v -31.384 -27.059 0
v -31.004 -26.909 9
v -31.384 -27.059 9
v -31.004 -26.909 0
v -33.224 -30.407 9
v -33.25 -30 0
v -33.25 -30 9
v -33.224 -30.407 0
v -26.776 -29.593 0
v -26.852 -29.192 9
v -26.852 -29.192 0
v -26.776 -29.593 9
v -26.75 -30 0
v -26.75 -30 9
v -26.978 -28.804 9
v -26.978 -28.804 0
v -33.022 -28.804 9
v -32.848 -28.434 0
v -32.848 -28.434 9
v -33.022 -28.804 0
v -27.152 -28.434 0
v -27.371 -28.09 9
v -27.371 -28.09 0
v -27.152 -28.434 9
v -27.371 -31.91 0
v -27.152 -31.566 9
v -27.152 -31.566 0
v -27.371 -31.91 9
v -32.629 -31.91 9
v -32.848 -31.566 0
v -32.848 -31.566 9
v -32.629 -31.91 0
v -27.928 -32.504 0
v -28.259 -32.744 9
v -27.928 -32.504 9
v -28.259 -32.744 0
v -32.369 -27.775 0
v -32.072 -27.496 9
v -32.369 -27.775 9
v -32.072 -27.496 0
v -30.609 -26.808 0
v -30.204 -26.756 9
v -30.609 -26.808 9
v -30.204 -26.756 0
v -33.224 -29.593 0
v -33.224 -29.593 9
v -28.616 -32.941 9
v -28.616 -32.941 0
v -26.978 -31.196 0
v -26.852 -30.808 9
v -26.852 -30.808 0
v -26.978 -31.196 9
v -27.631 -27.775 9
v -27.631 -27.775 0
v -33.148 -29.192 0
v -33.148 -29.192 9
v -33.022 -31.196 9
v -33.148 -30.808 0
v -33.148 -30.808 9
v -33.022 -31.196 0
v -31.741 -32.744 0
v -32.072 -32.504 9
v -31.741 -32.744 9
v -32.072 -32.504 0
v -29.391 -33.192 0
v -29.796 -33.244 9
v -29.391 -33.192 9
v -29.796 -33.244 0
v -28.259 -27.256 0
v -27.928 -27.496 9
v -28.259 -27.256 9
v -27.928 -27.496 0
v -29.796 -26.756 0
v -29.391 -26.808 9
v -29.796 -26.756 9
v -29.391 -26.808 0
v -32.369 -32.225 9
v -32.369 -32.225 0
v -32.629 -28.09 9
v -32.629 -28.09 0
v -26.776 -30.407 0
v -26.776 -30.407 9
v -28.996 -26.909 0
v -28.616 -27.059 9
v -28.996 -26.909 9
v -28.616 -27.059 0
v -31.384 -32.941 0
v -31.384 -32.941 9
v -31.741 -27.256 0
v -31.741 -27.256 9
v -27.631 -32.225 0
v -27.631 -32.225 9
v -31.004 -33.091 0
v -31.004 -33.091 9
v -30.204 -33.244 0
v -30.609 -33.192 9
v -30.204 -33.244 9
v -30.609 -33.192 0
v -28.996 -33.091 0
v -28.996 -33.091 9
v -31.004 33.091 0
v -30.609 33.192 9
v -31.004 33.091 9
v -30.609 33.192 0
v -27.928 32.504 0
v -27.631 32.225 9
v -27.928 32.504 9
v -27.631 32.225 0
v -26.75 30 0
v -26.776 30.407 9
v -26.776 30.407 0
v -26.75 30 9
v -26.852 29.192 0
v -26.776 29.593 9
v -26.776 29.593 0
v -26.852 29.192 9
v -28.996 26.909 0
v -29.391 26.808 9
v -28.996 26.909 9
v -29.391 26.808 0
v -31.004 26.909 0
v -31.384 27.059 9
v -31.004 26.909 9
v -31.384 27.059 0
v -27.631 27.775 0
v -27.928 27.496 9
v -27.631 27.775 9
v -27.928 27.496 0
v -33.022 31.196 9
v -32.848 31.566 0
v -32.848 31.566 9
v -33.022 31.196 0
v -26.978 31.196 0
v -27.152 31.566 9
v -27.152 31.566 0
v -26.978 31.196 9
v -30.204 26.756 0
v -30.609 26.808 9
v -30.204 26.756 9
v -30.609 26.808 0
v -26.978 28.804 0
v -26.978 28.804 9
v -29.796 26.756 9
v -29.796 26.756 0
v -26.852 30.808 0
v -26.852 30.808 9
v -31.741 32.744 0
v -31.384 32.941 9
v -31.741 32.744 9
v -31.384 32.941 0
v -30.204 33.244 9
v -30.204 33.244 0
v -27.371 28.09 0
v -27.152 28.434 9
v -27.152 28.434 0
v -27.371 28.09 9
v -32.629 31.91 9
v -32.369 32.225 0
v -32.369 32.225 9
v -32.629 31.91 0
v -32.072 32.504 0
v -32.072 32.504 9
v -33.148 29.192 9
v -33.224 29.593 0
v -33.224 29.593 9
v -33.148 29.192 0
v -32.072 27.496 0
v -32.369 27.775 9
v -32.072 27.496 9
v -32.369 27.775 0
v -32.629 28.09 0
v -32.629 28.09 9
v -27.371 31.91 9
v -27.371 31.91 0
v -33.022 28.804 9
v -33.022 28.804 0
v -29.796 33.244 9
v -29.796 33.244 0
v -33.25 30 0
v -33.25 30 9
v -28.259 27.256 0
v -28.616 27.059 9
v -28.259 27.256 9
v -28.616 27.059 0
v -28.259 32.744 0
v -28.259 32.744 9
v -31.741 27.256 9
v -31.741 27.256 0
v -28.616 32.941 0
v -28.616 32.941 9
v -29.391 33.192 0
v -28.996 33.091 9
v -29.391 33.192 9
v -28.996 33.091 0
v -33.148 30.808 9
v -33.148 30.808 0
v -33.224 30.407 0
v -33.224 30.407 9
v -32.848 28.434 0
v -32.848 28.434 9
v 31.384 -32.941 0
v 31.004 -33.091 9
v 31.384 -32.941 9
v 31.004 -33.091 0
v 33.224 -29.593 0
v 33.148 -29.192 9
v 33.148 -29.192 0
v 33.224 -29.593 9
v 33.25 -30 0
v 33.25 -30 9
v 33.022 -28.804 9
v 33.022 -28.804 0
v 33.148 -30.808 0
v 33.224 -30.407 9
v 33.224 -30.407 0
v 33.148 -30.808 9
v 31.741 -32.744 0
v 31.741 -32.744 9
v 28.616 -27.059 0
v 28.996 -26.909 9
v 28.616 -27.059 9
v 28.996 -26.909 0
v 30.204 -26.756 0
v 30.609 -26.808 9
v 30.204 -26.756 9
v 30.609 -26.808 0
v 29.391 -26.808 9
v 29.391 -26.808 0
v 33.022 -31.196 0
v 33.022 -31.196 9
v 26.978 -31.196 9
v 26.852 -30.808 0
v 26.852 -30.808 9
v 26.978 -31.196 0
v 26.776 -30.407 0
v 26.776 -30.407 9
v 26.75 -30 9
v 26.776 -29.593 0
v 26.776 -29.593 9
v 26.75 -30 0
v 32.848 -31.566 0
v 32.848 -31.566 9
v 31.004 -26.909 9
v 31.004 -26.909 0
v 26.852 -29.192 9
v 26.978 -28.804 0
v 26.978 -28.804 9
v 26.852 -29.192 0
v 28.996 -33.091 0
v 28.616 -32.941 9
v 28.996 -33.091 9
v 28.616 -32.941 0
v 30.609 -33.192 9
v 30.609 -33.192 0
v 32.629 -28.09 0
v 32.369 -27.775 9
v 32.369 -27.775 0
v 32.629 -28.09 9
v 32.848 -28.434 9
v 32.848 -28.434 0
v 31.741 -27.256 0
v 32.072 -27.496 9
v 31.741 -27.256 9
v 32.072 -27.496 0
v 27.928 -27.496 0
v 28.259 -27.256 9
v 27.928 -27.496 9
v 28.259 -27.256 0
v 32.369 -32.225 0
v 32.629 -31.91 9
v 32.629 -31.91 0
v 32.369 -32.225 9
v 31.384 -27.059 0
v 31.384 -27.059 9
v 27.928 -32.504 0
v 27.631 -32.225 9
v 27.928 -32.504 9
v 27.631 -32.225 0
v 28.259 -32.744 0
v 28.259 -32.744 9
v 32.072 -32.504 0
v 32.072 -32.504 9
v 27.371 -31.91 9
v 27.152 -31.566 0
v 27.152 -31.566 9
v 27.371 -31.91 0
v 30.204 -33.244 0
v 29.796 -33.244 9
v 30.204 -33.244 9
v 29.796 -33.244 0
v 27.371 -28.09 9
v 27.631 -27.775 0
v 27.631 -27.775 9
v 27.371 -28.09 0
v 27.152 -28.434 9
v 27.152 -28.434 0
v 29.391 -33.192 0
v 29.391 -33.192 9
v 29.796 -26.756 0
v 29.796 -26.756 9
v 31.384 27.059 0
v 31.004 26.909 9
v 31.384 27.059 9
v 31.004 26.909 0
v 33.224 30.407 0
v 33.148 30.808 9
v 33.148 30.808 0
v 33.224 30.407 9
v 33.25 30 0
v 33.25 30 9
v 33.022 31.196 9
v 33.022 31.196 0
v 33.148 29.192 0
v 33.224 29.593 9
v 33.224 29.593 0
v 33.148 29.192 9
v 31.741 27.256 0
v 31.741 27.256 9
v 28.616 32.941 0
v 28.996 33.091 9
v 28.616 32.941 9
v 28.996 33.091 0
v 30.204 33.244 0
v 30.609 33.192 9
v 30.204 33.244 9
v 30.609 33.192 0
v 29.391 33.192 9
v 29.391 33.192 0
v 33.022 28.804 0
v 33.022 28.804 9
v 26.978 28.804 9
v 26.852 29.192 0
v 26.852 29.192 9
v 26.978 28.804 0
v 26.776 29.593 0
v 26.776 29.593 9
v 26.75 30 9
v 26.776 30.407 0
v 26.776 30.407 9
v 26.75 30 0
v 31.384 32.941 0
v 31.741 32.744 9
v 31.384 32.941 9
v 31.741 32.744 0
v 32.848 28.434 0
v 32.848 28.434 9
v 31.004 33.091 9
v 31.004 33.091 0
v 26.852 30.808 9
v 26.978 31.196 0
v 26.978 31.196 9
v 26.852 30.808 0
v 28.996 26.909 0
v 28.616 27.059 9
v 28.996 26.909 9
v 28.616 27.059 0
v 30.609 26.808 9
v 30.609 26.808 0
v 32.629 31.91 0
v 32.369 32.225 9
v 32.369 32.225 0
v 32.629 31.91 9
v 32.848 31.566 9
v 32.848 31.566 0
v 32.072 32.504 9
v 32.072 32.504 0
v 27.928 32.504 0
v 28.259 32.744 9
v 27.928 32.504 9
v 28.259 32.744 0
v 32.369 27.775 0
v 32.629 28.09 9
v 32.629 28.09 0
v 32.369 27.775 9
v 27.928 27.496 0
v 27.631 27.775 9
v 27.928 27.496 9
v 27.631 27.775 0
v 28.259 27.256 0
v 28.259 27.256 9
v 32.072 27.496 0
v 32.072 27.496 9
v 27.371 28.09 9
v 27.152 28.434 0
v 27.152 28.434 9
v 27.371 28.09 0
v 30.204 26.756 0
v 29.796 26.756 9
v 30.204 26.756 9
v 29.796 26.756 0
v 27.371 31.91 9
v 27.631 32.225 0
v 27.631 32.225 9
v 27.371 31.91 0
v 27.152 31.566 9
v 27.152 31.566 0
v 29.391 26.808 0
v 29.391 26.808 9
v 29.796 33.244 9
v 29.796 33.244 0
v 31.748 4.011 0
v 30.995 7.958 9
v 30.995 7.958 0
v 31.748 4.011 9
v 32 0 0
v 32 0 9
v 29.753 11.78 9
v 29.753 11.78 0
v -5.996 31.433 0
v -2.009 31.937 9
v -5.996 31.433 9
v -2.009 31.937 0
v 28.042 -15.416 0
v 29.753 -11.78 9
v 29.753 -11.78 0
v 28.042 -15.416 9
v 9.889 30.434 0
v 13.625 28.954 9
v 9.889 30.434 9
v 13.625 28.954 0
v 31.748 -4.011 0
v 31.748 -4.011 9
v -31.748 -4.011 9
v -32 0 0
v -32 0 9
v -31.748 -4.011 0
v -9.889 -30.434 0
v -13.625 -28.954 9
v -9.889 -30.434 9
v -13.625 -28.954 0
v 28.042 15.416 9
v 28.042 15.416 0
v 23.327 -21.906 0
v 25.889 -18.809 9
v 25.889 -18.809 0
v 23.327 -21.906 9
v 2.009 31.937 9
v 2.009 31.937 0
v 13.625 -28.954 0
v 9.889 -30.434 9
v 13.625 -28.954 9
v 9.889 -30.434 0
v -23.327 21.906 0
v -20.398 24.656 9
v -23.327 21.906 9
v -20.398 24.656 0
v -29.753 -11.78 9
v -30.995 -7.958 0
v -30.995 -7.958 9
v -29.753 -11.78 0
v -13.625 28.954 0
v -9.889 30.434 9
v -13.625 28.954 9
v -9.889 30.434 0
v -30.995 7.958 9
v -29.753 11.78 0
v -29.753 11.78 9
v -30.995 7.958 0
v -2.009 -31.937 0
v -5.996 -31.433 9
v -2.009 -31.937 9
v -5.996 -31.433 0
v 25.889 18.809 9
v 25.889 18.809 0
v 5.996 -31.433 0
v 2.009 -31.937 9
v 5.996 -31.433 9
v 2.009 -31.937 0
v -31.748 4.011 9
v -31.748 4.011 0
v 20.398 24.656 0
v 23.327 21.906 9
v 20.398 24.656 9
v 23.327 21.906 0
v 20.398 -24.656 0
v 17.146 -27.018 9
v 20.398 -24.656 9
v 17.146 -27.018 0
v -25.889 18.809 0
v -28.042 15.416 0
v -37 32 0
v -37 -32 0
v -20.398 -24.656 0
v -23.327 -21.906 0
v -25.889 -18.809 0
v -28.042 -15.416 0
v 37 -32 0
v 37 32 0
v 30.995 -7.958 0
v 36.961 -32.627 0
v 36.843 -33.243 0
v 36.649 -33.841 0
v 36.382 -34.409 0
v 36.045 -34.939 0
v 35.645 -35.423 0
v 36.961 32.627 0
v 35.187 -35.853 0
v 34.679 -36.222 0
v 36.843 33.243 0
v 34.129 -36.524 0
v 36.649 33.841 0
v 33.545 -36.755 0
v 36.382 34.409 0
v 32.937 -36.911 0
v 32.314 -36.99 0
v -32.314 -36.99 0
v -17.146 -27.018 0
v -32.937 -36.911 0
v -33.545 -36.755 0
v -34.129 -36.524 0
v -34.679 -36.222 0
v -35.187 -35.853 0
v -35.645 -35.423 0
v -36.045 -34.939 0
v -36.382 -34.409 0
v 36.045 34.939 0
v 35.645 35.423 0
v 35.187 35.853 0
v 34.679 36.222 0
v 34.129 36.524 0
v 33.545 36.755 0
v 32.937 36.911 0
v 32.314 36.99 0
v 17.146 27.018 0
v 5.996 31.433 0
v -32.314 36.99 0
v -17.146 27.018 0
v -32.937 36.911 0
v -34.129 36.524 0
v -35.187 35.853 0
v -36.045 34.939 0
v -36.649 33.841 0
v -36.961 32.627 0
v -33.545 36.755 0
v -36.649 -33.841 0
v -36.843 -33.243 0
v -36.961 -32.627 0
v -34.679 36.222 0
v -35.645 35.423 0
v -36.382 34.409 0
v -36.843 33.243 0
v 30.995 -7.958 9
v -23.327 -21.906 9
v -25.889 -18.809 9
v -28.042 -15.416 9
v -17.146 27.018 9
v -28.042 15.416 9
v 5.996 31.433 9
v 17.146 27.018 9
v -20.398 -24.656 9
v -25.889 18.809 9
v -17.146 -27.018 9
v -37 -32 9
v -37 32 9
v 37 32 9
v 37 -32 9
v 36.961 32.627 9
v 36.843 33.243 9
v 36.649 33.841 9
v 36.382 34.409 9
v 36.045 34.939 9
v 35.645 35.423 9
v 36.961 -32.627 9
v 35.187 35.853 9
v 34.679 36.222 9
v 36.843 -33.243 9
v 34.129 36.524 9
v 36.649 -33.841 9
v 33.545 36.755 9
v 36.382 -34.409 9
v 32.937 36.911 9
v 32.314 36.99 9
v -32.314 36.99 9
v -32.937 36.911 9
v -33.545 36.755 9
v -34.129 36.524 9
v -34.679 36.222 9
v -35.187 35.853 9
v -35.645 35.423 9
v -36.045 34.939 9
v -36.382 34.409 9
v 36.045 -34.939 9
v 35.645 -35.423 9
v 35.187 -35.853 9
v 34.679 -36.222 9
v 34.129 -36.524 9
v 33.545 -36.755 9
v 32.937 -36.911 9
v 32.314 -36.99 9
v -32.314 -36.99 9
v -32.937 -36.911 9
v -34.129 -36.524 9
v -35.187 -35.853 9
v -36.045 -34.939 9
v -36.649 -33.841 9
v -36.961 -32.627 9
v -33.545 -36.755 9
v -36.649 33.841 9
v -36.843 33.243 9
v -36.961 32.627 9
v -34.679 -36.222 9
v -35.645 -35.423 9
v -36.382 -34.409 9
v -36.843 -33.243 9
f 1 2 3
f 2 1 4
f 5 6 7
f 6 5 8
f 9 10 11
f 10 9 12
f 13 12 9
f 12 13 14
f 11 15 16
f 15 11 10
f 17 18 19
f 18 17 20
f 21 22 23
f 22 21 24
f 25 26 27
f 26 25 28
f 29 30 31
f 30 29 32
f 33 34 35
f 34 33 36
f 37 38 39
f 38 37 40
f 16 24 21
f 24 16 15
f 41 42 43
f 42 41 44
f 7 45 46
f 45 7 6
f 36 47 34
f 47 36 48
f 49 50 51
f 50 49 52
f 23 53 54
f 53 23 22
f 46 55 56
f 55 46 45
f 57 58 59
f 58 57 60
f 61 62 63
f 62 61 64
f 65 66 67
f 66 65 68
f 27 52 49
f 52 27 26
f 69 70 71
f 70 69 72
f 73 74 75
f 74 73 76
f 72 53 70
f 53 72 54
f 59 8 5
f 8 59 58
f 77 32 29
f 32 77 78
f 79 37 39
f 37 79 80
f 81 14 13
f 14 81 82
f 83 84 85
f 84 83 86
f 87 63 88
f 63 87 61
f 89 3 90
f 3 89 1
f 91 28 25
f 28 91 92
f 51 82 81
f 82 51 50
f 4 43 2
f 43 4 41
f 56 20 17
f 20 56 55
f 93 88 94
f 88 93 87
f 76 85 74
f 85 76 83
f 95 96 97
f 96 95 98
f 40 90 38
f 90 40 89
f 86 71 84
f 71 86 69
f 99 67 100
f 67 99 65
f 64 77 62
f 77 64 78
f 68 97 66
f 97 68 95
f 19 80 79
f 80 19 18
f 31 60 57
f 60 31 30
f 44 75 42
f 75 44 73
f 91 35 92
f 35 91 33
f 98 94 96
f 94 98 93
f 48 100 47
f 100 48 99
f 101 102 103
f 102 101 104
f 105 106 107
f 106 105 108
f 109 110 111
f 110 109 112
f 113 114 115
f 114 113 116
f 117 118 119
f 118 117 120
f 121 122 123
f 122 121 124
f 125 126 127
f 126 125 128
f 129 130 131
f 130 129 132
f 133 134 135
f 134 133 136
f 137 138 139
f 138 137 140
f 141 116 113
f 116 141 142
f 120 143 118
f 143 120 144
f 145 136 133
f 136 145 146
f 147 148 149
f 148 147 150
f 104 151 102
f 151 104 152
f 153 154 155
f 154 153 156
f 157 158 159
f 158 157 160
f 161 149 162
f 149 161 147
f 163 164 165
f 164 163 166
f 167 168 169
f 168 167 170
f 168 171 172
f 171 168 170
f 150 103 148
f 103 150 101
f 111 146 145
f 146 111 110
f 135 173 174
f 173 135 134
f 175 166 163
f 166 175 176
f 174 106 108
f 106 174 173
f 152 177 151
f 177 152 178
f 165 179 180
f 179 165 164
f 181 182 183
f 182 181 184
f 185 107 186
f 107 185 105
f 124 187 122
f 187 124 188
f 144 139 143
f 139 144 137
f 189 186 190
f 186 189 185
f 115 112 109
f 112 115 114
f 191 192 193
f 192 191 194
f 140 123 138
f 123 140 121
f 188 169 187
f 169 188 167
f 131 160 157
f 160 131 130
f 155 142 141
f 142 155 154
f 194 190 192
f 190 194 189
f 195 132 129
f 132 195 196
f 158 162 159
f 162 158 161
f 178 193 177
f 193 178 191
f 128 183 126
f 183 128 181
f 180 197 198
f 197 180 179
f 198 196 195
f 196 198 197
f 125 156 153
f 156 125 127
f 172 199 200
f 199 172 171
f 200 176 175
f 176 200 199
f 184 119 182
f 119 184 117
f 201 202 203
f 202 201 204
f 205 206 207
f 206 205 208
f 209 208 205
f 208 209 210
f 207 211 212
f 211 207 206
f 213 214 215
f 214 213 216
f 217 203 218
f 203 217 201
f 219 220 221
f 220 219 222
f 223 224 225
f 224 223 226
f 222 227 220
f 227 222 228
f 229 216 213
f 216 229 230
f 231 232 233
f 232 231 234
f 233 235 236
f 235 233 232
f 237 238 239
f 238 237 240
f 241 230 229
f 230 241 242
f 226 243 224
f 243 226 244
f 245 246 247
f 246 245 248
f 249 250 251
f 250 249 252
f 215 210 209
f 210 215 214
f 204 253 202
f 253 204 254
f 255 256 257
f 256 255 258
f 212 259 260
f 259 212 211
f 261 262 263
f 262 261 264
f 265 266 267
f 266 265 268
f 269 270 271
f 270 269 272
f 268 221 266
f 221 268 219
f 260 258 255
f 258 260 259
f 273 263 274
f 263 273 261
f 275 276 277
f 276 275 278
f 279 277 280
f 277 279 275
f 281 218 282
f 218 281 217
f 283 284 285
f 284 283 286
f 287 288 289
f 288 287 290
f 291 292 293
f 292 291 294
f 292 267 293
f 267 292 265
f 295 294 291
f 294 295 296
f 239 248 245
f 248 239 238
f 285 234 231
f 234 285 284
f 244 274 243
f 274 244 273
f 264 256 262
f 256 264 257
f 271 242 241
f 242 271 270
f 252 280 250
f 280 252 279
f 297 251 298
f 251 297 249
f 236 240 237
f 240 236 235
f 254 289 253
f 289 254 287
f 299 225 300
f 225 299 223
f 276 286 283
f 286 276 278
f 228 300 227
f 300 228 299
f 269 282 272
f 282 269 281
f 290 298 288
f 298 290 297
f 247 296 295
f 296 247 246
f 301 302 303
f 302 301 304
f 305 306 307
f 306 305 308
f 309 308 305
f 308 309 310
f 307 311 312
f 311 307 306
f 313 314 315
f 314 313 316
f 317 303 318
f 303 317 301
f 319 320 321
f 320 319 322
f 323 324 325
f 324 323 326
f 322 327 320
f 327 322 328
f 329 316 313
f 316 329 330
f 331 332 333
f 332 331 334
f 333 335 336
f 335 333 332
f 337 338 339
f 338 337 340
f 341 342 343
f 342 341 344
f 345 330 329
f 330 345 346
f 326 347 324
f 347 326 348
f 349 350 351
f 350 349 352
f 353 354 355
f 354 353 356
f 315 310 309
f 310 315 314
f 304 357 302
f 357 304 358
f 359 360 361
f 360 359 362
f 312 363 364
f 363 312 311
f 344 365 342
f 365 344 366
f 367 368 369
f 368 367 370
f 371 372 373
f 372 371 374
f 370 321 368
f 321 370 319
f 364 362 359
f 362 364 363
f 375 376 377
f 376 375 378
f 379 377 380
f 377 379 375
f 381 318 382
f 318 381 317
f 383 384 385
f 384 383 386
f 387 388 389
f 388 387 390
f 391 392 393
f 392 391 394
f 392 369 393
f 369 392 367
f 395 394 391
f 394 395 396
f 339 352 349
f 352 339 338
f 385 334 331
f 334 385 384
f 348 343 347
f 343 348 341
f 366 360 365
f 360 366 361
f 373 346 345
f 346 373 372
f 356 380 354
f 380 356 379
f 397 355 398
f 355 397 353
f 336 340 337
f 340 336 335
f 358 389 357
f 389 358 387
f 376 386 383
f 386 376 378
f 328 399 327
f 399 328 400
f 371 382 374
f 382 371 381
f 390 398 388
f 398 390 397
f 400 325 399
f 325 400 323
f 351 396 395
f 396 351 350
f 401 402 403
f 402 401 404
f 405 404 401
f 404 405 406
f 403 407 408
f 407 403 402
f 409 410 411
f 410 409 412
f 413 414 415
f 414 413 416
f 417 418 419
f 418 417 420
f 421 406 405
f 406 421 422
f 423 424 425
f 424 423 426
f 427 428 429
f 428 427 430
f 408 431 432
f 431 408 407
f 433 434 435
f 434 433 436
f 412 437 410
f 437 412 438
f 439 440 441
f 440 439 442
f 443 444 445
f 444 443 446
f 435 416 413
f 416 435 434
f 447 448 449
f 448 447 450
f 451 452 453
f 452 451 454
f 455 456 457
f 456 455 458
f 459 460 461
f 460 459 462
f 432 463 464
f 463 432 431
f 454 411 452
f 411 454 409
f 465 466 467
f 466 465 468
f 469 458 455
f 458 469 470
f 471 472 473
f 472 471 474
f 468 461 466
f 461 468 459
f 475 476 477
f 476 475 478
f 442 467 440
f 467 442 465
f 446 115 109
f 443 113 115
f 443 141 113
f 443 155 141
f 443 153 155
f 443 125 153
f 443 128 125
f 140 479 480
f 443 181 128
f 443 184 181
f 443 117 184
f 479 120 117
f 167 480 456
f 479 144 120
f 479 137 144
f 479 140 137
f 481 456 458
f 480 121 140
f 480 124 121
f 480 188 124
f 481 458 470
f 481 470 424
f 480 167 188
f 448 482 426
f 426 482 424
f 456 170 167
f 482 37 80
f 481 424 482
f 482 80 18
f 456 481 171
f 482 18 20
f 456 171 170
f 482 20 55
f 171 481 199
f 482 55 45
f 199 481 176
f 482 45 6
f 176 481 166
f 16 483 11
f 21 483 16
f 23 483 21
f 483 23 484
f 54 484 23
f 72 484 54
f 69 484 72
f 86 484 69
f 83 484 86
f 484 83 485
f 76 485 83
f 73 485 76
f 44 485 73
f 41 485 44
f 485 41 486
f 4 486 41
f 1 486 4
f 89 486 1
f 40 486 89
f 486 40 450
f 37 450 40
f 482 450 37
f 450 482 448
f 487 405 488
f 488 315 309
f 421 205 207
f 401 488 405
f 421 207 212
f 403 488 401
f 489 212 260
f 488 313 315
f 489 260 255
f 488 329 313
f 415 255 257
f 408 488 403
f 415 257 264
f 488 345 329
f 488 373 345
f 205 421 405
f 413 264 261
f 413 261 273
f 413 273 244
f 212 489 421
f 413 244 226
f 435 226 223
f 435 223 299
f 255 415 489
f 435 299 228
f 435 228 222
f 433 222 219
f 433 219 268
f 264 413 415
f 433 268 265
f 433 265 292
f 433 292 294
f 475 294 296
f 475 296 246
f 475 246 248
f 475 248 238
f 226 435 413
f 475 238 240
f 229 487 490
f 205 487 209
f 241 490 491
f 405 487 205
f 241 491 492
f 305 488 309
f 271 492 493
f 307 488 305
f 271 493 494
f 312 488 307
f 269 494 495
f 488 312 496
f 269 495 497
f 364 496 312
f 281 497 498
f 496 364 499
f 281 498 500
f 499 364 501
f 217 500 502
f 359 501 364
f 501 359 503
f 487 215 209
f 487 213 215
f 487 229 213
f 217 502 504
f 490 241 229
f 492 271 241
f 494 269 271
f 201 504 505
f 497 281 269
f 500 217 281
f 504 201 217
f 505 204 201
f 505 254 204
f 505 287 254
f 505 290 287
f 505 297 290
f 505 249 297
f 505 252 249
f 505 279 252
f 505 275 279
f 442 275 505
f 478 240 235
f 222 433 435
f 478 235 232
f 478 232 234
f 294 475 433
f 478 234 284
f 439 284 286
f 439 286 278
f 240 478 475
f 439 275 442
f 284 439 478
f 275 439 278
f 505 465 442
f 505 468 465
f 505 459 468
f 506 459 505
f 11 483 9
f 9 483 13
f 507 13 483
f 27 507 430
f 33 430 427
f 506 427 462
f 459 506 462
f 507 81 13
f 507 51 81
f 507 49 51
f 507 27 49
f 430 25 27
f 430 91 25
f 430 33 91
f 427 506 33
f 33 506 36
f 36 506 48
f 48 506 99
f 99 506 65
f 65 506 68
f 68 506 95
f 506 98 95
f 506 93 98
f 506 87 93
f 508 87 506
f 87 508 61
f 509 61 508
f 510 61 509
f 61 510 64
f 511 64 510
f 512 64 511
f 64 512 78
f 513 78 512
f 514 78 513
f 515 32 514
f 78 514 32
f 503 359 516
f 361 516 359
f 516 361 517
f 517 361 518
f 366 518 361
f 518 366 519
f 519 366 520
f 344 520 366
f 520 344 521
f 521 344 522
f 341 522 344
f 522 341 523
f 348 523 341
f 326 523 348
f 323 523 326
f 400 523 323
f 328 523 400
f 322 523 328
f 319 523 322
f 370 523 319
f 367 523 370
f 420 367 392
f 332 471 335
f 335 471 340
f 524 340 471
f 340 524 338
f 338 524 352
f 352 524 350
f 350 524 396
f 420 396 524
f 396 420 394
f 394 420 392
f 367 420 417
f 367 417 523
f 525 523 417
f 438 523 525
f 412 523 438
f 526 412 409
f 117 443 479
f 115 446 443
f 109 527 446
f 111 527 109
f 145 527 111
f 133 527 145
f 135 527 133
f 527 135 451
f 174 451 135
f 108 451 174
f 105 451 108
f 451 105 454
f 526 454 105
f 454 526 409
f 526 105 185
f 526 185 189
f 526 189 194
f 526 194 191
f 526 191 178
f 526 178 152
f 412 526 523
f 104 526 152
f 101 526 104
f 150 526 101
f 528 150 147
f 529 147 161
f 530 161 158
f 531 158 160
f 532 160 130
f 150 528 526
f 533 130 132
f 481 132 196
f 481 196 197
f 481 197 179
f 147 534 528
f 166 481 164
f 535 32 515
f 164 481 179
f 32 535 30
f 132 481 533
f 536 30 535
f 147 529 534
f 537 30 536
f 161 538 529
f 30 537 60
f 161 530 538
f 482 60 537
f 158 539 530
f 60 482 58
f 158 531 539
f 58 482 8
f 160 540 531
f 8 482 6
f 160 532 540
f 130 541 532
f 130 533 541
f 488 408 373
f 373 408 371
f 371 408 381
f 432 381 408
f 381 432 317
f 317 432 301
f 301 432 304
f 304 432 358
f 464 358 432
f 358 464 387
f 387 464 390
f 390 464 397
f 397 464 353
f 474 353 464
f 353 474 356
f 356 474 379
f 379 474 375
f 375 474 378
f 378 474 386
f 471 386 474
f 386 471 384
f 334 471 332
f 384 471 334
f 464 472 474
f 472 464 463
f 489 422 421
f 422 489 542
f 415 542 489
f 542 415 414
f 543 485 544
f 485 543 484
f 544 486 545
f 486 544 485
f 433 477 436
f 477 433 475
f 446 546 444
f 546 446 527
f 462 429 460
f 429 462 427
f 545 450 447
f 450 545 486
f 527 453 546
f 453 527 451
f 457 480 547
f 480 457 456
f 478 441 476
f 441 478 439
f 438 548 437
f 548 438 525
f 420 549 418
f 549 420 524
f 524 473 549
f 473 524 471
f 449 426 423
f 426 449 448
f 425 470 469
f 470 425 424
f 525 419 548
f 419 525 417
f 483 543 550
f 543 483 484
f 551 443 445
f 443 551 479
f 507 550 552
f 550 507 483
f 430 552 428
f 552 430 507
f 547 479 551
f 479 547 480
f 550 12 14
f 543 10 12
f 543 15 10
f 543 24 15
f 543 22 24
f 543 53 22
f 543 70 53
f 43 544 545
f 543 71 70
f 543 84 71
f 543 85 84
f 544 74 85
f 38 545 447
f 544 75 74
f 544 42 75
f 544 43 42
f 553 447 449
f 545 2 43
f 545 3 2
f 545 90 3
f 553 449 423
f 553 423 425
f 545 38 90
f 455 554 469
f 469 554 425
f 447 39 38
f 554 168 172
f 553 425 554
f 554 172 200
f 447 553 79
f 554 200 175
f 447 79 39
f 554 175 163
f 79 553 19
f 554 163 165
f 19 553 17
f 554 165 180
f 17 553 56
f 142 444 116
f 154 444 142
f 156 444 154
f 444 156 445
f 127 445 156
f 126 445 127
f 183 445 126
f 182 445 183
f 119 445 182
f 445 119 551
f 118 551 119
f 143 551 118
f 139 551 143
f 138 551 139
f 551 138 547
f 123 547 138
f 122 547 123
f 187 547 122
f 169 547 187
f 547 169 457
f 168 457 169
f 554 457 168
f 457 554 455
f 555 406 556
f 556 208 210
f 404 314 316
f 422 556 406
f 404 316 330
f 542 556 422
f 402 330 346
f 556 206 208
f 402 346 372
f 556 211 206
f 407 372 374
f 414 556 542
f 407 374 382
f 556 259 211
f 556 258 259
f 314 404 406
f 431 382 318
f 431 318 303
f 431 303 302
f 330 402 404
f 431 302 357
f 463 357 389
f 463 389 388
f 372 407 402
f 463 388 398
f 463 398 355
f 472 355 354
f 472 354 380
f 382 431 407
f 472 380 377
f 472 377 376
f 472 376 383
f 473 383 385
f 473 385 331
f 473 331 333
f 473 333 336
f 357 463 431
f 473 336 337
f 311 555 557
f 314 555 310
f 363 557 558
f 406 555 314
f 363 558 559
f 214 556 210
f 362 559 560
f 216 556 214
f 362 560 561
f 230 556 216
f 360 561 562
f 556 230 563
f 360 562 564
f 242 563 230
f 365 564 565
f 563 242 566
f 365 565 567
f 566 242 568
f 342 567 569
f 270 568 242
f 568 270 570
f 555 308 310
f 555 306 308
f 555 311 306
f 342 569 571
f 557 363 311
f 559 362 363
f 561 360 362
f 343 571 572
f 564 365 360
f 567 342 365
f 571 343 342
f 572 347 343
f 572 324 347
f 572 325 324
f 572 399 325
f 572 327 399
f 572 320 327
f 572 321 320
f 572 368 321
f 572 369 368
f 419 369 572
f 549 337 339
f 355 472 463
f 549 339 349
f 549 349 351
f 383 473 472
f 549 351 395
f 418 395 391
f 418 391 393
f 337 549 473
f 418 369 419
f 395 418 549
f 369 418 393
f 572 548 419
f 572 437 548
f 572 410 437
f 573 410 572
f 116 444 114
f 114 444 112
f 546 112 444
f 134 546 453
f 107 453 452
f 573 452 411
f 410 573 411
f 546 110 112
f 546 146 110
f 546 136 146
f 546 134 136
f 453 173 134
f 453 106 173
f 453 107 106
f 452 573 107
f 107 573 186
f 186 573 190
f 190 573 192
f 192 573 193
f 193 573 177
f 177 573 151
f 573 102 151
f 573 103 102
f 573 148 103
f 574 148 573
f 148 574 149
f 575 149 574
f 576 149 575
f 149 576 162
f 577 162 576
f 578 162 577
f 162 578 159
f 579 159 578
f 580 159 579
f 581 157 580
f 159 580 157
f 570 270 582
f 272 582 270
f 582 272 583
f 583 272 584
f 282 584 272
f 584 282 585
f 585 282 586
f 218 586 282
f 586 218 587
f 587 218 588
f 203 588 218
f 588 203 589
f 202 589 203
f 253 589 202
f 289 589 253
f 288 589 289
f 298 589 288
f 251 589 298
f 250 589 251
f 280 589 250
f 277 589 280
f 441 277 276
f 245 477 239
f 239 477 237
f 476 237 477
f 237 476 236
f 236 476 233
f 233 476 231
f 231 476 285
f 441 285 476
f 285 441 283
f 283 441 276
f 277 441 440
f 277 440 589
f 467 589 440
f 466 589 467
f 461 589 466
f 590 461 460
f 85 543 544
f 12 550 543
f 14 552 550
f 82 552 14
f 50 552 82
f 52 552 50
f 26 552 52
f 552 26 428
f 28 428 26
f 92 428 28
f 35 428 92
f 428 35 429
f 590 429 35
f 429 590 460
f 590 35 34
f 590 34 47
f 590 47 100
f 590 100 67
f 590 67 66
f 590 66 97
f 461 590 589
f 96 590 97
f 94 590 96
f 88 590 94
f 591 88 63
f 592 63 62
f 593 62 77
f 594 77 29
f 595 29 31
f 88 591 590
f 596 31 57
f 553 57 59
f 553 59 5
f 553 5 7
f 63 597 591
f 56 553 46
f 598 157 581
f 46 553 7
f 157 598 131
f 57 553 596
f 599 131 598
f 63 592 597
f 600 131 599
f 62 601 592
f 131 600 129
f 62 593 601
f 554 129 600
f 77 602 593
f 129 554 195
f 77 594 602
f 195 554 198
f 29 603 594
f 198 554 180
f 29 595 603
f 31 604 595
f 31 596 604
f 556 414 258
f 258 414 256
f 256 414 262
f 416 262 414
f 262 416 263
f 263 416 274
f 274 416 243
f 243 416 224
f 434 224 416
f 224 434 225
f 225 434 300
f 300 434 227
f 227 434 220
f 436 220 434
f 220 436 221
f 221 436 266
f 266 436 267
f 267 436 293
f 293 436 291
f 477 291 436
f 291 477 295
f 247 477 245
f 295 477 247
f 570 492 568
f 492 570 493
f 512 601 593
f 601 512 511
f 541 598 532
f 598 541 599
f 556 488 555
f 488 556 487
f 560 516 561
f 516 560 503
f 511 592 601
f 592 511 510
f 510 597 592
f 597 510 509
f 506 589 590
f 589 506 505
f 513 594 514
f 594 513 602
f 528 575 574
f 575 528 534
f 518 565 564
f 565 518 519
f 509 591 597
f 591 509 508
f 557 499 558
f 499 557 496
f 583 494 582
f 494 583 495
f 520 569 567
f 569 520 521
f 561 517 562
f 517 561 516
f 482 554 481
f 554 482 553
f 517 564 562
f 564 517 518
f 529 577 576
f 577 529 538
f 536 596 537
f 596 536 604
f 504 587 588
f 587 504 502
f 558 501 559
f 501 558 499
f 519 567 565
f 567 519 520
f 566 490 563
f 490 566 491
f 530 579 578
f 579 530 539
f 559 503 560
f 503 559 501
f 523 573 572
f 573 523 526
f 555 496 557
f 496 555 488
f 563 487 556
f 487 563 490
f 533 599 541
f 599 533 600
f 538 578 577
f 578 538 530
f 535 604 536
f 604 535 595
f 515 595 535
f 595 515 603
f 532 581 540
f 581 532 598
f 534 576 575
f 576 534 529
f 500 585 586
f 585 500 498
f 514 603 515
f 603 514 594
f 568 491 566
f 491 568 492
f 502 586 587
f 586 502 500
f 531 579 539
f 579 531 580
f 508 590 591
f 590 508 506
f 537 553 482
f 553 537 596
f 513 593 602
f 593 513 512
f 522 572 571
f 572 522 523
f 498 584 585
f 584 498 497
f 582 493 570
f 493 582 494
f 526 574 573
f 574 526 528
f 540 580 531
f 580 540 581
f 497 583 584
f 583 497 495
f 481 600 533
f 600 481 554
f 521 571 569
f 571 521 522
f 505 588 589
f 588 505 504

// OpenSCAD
$fn = 50;


difference() {
	union() {
		hull() {
			translate(v = [-32.0000000000, 32.0000000000, 0]) {
				cylinder(h = 9, r = 5);
			}
			translate(v = [32.0000000000, 32.0000000000, 0]) {
				cylinder(h = 9, r = 5);
			}
			translate(v = [-32.0000000000, -32.0000000000, 0]) {
				cylinder(h = 9, r = 5);
			}
			translate(v = [32.0000000000, -32.0000000000, 0]) {
				cylinder(h = 9, r = 5);
			}
		}
	}
	union() {
		#translate(v = [-30.0000000000, -30.0000000000, -100.0000000000]) {
			cylinder(h = 200, r = 3.2500000000);
		}
		#translate(v = [-30.0000000000, 30.0000000000, -100.0000000000]) {
			cylinder(h = 200, r = 3.2500000000);
		}
		#translate(v = [30.0000000000, -30.0000000000, -100.0000000000]) {
			cylinder(h = 200, r = 3.2500000000);
		}
		#translate(v = [30.0000000000, 30.0000000000, -100.0000000000]) {
			cylinder(h = 200, r = 3.2500000000);
		}
		#cylinder(h = 9, r = 32.0000000000);
	}
}
